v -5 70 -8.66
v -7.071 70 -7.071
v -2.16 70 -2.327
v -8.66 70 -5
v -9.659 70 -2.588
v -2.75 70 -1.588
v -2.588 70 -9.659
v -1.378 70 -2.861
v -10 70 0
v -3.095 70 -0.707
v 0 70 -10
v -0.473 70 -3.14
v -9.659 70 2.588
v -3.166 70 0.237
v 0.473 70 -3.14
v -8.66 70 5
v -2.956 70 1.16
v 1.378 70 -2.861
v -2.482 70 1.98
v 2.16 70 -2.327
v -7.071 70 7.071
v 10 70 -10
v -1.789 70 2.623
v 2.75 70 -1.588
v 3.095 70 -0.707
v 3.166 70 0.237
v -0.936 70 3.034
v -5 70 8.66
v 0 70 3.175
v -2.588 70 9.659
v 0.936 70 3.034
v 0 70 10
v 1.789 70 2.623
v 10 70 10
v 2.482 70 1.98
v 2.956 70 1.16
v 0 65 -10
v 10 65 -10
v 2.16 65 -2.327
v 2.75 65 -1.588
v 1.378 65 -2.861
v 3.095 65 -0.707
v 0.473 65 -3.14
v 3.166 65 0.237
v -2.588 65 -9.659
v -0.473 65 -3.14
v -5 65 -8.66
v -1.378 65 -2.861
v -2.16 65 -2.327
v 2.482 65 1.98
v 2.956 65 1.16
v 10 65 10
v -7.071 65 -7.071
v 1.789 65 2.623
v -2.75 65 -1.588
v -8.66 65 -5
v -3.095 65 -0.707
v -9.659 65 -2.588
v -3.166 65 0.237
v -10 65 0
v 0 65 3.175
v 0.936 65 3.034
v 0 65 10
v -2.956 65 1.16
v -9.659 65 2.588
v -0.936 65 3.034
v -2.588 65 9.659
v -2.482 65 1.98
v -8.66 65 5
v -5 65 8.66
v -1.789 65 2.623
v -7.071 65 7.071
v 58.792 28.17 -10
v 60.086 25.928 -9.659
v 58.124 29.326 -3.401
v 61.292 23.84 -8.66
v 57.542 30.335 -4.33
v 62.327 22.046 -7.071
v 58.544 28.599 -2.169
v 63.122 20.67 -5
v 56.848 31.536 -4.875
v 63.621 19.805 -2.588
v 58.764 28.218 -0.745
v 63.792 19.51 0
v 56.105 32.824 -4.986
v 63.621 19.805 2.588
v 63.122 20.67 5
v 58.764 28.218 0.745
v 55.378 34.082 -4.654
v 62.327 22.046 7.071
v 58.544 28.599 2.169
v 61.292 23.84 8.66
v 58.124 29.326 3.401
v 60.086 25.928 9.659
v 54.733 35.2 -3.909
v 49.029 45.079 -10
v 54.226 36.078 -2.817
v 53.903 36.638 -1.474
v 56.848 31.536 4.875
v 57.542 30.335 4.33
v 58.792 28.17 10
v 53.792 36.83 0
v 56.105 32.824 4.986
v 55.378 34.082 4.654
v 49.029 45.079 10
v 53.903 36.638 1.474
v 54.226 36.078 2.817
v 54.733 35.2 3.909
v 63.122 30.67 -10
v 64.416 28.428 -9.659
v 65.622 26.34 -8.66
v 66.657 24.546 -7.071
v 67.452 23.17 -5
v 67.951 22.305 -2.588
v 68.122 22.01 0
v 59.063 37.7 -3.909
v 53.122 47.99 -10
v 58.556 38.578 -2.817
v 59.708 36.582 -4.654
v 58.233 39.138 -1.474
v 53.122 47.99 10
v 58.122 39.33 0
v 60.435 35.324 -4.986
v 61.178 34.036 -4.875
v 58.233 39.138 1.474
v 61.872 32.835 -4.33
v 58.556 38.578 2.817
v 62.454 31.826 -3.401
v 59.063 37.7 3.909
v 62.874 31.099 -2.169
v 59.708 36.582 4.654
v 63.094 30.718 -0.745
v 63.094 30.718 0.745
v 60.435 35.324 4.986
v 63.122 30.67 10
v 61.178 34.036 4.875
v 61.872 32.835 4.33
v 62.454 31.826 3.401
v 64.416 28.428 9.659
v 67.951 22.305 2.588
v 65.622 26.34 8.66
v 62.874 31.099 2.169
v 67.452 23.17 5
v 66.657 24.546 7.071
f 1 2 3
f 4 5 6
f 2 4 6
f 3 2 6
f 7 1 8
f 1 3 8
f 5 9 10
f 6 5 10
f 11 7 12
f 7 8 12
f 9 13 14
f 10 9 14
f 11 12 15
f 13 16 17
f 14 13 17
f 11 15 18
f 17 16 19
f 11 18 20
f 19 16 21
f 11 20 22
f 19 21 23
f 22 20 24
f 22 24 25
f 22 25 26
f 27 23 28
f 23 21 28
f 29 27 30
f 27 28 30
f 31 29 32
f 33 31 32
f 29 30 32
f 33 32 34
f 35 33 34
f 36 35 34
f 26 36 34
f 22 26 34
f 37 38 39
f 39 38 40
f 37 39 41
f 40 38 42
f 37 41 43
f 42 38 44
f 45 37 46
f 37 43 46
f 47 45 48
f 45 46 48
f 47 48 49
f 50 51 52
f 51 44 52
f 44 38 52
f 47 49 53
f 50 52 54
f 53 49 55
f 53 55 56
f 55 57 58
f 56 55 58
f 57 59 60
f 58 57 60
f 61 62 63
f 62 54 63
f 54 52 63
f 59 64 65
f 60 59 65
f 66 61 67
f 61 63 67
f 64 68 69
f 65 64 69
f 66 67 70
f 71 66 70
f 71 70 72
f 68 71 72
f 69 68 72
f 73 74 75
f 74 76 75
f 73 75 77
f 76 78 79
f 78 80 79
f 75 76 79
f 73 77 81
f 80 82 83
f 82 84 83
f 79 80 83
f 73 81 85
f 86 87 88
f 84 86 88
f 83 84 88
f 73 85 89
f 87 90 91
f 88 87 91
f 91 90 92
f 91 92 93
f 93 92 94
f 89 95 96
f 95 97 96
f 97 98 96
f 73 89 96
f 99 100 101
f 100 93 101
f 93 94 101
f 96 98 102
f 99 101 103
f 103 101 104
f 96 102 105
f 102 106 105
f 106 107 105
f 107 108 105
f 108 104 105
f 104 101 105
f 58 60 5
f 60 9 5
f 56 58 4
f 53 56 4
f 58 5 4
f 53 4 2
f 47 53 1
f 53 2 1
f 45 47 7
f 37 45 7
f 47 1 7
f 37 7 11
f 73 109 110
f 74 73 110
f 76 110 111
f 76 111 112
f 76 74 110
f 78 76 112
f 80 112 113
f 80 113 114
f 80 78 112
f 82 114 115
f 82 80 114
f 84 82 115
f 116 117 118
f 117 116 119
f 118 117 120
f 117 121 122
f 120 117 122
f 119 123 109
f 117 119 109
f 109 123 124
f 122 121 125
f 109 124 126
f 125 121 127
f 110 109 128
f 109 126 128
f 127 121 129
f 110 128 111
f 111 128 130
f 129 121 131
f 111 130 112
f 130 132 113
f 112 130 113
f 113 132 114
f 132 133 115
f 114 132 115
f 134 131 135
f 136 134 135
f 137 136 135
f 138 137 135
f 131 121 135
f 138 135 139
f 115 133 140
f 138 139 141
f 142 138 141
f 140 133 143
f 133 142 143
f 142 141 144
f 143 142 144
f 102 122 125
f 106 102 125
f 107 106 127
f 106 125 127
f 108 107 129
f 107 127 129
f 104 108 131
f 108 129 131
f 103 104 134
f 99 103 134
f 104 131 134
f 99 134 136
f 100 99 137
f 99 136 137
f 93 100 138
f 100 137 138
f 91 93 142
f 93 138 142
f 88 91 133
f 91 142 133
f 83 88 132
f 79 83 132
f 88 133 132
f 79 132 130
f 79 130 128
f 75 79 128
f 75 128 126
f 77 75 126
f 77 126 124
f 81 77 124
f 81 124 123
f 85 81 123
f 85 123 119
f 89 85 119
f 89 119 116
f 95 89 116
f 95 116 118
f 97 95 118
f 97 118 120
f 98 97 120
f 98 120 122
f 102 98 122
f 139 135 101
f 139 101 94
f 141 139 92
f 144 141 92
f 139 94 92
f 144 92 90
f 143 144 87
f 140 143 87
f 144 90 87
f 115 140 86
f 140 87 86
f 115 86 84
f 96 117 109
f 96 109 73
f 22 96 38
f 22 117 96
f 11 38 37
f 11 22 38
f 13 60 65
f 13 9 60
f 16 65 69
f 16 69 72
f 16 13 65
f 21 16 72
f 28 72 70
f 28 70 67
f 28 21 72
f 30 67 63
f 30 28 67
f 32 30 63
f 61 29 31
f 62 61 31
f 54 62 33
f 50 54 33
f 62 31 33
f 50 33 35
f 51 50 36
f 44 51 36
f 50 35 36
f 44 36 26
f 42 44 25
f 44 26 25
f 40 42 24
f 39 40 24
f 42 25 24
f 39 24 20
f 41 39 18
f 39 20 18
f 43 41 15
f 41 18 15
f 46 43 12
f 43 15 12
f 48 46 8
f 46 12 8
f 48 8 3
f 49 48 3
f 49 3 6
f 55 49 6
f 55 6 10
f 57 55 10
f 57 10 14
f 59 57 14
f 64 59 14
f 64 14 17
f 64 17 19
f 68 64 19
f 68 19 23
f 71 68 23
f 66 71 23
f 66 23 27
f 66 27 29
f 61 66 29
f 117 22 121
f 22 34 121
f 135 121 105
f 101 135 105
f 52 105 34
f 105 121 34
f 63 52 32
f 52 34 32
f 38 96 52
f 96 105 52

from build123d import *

# Parameters (mm, degrees)
BOSS_EXTRUDE1_DEPTH = 10
SKETCH2_R           = 3.175
CUT_EXTRUDE1_DEPTH  = 86.380649173
SKETCH3_R           = 5
CUT_EXTRUDE2_DEPTH  = 80.450837411
FILLET1_R           = 10


with BuildPart() as part:
    # Sketch1 → Boss-Extrude1 (new, symmetric)
    with BuildSketch(Plane.XY):
        Polygon((-10, 70), (10, 70), (53.121778265, 47.990381057), (68.121778265, 22.009618943), (63.791651246, 19.509618943), (49.028935235, 45.079393131), (10, 65), (-10, 65), align=None)
    extrude(amount=BOSS_EXTRUDE1_DEPTH, both=True)

    # Sketch2 → Cut-Extrude1 (cut, through all)
    with BuildSketch(Plane(origin=(0, 70, 0), x_dir=(1, 0, 0), z_dir=(0, 1, 0))):
        with Locations(Location((0, 0, 0), (0, 0, 270))):
            Circle(SKETCH2_R)
    extrude(amount=-CUT_EXTRUDE1_DEPTH, mode=Mode.SUBTRACT)

    # Sketch3 → Cut-Extrude2 (cut, through all)
    with BuildSketch(Plane(origin=(60.621778265, 35, 0), x_dir=(0, 0, -1), z_dir=(0.8660254037844397, 0.499999999999998, 0))):
        with Locations(Location((0, 0, 0), (0, 0, 90))):
            Circle(SKETCH3_R)
    extrude(amount=-CUT_EXTRUDE2_DEPTH, mode=Mode.SUBTRACT)

    # Fillet1
    fillet1_edges = [part.edges().sort_by_distance(p)[0] for p in [
        (65.956714755, 20.759618943, -10),
        (65.956714755, 20.759618943, 10),
        (-10, 67.5, -10),
        (-10, 67.5, 10),
    ]]
    fillet(fillet1_edges, radius=FILLET1_R - 0.0001)  # a hair under: the kernel refuses the full size


solid = part.part
